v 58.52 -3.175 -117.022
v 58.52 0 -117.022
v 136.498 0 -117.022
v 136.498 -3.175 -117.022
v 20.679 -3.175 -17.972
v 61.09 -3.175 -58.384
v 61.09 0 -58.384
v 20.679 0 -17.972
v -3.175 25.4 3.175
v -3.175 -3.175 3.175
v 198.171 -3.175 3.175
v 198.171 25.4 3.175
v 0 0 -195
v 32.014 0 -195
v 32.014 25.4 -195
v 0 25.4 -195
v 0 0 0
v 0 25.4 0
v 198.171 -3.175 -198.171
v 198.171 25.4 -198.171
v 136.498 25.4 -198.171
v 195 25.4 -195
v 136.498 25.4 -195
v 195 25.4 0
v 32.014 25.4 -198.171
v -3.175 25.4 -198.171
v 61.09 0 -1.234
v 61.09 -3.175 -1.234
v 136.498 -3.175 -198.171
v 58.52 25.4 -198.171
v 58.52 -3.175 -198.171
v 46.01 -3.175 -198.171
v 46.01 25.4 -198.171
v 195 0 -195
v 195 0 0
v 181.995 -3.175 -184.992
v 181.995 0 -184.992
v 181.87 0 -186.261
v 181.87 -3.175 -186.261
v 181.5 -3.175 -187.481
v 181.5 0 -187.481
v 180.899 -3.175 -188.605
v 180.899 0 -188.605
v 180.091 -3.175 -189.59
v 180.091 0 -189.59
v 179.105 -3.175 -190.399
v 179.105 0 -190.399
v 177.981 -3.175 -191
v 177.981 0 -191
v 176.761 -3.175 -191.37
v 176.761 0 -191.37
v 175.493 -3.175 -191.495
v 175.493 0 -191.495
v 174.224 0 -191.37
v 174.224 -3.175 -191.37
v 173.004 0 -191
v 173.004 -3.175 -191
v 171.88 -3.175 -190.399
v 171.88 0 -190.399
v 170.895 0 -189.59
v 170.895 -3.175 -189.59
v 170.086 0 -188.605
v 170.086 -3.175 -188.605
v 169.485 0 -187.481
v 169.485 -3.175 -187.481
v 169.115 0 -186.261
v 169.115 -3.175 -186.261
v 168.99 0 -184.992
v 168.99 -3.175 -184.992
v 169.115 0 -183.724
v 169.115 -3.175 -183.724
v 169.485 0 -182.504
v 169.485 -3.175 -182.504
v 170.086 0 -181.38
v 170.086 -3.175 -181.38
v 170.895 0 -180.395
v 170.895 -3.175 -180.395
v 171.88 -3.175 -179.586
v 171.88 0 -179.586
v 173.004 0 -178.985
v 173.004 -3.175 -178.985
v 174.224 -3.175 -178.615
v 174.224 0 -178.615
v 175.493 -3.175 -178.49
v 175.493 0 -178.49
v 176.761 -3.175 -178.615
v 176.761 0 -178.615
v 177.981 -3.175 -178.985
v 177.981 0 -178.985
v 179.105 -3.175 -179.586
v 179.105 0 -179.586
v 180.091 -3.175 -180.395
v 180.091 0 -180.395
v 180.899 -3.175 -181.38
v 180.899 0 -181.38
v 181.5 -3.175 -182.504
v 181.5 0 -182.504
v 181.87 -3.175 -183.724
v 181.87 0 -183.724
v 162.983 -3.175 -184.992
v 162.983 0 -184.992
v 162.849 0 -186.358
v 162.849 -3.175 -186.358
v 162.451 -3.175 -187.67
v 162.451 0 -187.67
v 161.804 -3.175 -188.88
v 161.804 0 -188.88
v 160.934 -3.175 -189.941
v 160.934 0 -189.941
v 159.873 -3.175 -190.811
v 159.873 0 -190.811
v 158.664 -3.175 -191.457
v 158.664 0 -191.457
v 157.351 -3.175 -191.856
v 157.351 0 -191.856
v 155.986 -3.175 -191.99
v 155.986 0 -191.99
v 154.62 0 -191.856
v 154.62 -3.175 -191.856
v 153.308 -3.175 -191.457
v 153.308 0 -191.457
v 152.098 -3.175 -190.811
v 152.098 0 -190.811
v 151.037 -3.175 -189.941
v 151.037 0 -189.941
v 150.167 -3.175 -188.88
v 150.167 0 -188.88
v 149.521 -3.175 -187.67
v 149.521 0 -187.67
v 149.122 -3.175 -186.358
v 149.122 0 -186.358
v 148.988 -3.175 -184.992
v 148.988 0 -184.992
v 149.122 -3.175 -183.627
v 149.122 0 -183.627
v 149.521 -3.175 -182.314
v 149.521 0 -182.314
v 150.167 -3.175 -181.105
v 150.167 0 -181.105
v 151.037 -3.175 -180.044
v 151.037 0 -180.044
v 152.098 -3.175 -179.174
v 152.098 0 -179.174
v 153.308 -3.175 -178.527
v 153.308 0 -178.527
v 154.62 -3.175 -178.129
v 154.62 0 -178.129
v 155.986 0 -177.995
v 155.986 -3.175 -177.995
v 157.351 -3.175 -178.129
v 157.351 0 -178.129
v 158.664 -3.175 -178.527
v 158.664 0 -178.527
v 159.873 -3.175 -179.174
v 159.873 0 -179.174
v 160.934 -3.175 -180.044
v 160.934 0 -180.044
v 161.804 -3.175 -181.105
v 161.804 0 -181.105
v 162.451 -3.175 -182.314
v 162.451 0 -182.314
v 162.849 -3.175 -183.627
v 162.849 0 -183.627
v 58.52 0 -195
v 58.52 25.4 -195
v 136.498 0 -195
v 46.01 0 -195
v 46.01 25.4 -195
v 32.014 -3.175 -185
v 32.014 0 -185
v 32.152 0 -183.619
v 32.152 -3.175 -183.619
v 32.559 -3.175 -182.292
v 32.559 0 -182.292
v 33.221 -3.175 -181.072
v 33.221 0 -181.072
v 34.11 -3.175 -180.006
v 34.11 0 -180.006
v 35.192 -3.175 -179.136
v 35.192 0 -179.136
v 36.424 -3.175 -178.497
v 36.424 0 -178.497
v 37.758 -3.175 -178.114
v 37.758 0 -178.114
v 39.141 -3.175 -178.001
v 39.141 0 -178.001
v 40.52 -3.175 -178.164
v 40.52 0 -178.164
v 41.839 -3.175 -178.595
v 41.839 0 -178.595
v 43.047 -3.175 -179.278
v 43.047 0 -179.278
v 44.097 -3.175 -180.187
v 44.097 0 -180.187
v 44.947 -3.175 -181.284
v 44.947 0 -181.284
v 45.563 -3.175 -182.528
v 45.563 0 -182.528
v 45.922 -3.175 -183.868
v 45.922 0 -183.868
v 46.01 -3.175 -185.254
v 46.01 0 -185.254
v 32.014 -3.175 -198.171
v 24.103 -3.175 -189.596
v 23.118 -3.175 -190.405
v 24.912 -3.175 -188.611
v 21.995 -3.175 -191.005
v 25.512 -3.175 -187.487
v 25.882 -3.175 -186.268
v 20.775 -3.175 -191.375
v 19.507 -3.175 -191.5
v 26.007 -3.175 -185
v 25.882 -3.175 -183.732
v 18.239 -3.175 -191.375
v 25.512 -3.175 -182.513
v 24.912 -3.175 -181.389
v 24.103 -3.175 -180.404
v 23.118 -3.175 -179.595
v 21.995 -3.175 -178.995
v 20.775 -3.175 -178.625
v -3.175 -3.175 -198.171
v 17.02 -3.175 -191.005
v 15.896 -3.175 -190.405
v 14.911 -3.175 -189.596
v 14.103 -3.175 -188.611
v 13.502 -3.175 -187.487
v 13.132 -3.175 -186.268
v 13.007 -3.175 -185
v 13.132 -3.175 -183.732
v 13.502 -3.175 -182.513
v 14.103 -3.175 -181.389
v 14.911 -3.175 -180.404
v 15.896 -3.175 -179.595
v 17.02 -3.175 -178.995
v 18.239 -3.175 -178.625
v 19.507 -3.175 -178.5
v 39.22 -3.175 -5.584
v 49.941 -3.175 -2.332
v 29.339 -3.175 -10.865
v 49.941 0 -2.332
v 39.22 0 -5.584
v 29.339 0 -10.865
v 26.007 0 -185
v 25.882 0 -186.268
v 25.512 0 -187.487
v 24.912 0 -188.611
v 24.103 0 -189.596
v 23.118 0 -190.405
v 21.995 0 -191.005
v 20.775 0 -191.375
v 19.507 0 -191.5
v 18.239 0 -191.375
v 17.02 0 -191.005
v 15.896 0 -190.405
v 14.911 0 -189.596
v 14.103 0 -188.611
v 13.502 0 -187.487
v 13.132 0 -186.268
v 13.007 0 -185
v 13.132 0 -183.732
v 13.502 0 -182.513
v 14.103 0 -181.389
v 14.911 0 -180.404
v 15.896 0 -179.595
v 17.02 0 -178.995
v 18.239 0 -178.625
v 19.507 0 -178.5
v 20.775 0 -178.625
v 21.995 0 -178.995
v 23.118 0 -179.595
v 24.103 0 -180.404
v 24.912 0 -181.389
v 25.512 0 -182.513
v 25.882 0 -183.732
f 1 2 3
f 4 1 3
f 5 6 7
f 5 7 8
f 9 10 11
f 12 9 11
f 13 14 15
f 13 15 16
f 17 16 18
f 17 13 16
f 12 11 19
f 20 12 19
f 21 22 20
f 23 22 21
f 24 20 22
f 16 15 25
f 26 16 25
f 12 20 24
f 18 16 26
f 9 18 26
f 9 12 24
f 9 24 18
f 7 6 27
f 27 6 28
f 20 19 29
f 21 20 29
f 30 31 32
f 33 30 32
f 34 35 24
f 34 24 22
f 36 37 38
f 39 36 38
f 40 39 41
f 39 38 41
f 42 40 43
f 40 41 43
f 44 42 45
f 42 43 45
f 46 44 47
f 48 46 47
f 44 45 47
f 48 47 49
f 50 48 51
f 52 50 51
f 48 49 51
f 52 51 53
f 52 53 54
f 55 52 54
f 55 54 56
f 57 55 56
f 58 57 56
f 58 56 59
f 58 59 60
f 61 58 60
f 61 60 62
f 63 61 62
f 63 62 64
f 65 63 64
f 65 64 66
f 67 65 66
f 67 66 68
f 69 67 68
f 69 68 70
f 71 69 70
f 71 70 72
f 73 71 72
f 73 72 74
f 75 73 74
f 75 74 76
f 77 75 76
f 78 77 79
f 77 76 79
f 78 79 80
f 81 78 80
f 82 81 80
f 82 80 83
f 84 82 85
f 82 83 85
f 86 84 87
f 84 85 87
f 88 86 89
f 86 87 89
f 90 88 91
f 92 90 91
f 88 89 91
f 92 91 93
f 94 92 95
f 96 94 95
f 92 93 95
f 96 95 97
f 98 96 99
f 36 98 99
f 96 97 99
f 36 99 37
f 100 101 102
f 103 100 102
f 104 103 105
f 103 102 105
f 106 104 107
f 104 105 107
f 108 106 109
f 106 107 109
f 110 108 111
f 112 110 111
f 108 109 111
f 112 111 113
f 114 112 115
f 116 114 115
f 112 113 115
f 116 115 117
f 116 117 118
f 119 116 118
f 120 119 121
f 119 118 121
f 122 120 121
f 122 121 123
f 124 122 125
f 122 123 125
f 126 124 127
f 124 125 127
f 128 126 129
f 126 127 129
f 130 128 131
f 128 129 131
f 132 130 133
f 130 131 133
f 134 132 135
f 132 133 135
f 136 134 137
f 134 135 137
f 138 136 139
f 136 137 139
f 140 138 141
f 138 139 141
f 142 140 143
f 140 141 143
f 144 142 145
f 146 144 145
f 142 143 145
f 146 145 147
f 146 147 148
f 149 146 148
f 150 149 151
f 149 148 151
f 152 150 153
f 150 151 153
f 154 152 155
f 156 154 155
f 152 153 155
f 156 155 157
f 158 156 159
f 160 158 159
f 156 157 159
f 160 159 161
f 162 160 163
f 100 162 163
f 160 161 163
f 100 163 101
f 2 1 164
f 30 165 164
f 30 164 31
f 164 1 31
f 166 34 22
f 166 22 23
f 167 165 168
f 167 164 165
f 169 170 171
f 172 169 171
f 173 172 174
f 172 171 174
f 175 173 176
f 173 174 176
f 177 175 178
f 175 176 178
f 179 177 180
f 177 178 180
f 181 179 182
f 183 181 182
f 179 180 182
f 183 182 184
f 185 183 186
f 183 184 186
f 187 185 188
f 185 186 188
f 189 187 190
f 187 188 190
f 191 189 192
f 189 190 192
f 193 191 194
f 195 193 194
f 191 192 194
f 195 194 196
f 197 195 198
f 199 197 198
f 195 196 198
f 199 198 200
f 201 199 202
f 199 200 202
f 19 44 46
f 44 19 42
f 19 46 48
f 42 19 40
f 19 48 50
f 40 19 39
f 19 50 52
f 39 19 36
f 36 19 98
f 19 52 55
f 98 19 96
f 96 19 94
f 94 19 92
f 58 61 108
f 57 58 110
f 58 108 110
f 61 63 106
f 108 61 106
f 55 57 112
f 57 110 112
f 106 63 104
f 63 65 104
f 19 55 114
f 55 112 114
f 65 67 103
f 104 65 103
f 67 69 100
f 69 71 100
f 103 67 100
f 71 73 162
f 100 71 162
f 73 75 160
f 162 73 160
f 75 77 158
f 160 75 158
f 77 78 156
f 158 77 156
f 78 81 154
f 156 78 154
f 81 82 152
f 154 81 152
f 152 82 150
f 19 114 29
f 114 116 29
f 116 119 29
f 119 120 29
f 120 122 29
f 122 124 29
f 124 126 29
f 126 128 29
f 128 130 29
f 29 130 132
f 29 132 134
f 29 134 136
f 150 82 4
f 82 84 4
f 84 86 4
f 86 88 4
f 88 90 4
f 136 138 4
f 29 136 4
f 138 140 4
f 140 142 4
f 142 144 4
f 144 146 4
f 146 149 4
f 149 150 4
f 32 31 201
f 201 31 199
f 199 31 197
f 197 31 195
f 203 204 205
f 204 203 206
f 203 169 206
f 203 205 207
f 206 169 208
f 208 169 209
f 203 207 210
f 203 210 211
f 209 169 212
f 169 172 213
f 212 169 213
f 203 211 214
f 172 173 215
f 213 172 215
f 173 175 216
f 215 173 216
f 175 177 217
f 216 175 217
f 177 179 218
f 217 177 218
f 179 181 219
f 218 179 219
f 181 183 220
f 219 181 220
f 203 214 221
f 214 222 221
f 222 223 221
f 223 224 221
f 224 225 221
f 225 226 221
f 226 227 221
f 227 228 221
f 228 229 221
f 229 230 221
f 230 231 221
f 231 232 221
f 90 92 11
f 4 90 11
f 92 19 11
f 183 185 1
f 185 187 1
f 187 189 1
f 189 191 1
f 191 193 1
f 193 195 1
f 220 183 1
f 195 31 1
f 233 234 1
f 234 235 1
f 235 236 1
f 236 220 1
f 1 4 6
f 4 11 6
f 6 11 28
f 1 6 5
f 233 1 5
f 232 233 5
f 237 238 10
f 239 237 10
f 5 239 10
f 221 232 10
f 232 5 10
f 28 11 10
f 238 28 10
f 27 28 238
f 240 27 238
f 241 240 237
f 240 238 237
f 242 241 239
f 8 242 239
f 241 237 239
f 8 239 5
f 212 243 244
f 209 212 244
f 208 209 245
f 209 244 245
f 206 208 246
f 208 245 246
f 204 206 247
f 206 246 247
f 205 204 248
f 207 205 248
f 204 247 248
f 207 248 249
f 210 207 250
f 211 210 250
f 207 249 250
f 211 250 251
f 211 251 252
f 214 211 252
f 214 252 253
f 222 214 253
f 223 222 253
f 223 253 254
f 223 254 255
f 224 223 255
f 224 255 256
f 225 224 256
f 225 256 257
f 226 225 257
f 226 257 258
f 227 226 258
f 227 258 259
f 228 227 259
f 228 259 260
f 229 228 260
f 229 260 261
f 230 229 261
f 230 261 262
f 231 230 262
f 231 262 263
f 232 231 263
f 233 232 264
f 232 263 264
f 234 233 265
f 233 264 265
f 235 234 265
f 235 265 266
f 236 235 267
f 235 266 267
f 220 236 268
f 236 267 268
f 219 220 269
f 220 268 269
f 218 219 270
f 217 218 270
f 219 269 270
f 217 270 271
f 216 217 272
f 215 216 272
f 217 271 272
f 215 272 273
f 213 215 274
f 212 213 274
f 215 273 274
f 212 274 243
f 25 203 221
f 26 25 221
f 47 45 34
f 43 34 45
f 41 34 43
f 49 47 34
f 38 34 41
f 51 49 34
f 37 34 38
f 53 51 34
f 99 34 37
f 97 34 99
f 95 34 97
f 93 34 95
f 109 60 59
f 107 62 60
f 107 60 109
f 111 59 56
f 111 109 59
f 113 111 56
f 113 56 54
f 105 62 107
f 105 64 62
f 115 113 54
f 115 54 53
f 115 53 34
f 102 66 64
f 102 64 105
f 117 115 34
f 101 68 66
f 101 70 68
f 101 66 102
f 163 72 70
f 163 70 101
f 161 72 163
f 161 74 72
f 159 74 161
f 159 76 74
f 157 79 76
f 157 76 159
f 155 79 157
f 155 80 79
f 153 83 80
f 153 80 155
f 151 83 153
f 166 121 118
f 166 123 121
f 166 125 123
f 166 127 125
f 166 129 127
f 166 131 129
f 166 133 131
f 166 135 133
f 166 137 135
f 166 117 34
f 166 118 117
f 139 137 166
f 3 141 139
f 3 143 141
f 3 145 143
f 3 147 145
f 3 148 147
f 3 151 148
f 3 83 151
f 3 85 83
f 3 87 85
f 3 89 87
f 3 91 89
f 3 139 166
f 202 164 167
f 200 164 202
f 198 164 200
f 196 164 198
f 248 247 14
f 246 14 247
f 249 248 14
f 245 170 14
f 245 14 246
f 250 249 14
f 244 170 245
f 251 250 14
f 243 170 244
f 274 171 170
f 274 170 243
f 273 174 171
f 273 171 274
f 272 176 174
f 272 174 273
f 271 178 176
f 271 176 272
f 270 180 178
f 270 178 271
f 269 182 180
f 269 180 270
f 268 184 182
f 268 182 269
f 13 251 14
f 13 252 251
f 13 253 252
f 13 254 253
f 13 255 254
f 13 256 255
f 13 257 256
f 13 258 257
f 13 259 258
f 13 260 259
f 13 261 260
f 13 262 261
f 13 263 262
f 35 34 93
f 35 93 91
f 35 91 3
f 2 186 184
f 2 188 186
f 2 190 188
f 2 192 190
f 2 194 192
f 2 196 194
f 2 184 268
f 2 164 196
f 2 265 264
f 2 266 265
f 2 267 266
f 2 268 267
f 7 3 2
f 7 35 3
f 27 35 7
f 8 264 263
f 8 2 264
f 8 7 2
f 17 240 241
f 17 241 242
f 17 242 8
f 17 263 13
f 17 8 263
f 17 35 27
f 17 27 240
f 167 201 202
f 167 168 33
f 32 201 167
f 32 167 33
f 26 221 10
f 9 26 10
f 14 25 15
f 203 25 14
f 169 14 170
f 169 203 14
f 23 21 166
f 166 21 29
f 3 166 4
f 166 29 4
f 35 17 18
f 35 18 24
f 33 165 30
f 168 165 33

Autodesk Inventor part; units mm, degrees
ref_plane "YZ Plane" through (0, 0, 0) normal (1, 0, 0) x (0, 1, 0)
ref_plane "XZ Plane" through (0, 0, 0) normal (0, 1, 0) x (-1, 0, 0)
ref_plane "XY Plane" through (0, 0, 0) normal (0, 0, 1) x (1, 0, 0)
sketch "Sketch1" plane through (0, 0, 0) normal (0, 1, 0) x (-1, 0, 0)
  line L0 (0, 0) -> (-195, 0)
  line L1 (-195, 0) -> (-195, -195)
  line L2 (-195, -195) -> (0, -195)
  line L3 (0, -195) -> (0, 0)
  line L4 (3.175, 3.175) -> (-198.1708, 3.175)
  line L5 (-198.1708, 3.175) -> (-198.1708, -198.1708)
  line L6 (-198.1708, -198.1708) -> (3.175, -198.1708)
  line L7 (3.175, -198.1708) -> (3.175, 3.175)
  dimension "d0" = 195
  dimension "d1" = 195
  dimension "d2" = 201.3458
  dimension "d3" = 201.3458
extrude "Extrusion1" add sketch "Sketch1" along normal blind 25.4
sketch "Sketch2" plane through (0, 0, 0) normal (0, 1, 0) x (-1, 0, 0)
  line L0 (3.175, 3.175) -> (-198.1708, 3.175) projected
  line L1 (3.175, -198.1708) -> (3.175, 3.175) projected
  line L2 (-198.1708, 3.175) -> (-198.1708, -198.1708) projected
  line L3 (-198.1708, -198.1708) -> (3.175, -198.1708) projected
  point P0 (0, 0)
extrude "Extrusion2" add sketch "Sketch2" against normal blind 3.175
sketch "Sketch3" plane through (0, 0, 0) normal (0, 1, 0) x (1, 0, 0)
  line L0 (0, 195) -> (195, 195) projected
  line L1 (0, 195) -> (97.4979, 195)
  line L2 (97.4979, 195) -> (136.4979, 195)
  line L3 (97.4979, 195) -> (136.4979, 195) construction
  line L4 (136.4979, 195) -> (58.5199, 195)
  line L5 (58.5199, 195) -> (58.5199, 117.022)
  line L6 (58.5199, 117.022) -> (136.4979, 117.022)
  line L7 (136.4979, 117.022) -> (136.4979, 195)
  point P0 (0, 0)
  dimension "d8" = 97.4979
  dimension "d9" = 39
  dimension "d10" = 0
  dimension "d11" = 77.978
  dimension "d12" = 77.978
extrude "Extrusion3" cut sketch "Sketch3" against normal blind 3.175
sketch "Sketch4" plane through (0, 0, 0) normal (0, 1, 0) x (1, 0, 0)
  line L0 (0, 0) -> (0, 195) projected
  line L1 (0, 195) -> (195, 195) projected
  line L2 (58.5199, 117.022) -> (58.5199, 195) projected
  line L3 (136.4979, 195) -> (136.4979, 117.022) projected
  line L4 (195, 195) -> (195, 0) projected
  line L5 (0, 0) -> (0, 195) projected
  line L6 (0, 195) -> (19.5072, 195)
  line L7 (19.5072, 195) -> (39.0144, 195)
  line L8 (0, 195) -> (0, 185)
  circle A0 centre (19.5072, 185) radius 6.5
  circle A1 centre (39.0144, 185) radius 7
  line L9 (136.4979, 195) -> (195, 195) projected
  line L10 (195, 195) -> (195, 184.9924)
  line L11 (198.1708, 198.1708) -> (198.1708, -3.175) projected
  line L12 (195, 195) -> (205.0076, 195) construction
  line L13 (195, 195) -> (175.4928, 195)
  line L14 (195, 195) -> (214.5072, 195) construction
  line L15 (175.4928, 195) -> (155.9856, 195)
  circle A2 centre (175.4928, 184.9924) radius 6.5024
  circle A3 centre (155.9856, 184.9924) radius 6.9977
  dimension "d15" = 58.5199
  dimension "d16" = 19.5072
  dimension "d17" = 19.5072
  dimension "d18" = 10
  dimension "d19" = 13
  dimension "d20" = 14
  dimension "d21" = 10.0076
  dimension "d22" = 90
  dimension "d23" = 19.5072
  dimension "d24" = 180
  dimension "d25" = 19.5072
  dimension "d26" = 13.0048
  dimension "d27" = 13.9954
extrude "Extrusion4" cut sketch "Sketch4" against normal blind 3.175
sketch "Sketch5" plane through (0, -3.175, 0) normal (0, -1, 0) x (1, 0, 0)
  circle A0 centre (61.0901, -58.3837) radius 57.15
  line L0 (61.0901, -58.3837) -> (61.0901, -1.2337)
  line L1 (61.0901, -58.3837) -> (118.2401, -58.3837) construction
  line L2 (61.0901, -58.3837) -> (20.679, -17.9725)
  line L3 (61.0901, -58.3837) -> (118.2401, -58.3837) construction
  point P0 (0, 0)
  dimension "d32" = 114.3
  dimension "d33" = 57.15
  dimension "d34" = 90
  dimension "d35" = 57.15
  dimension "d36" = 135
extrude "Extrusion5" cut sketch "Sketch5" against normal blind 3.175 contours L0 L2 A0 picked at (52.2233, -21.4506)
sketch "Sketch6" plane through (0, -3.175, 0) normal (0, -1, 0) x (1, 0, 0)
  line L0 (136.4979, -195) -> (58.5199, -195) projected
  line L1 (-3.175, -198.1708) -> (198.1708, -198.1708) projected
  line L2 (136.4979, -195) -> (58.5199, -195)
  line L3 (58.5199, -195) -> (58.5199, -198.175)
  line L4 (58.5199, -198.175) -> (136.4979, -198.175)
  line L5 (136.4979, -198.175) -> (136.4979, -195)
  point P0 (0, 0)
  point P1 (136.4979, -198.1708)
  point P2 (58.5199, -198.1708)
  dimension "d39" = 3.175
extrude "Extrusion6" cut sketch "Sketch6" against normal through all contours L5 L1 L3 L0
sketch "Sketch7" plane through (0, -3.175, 0) normal (0, -1, 0) x (1, 0, 0)
  circle A0 centre (39.0144, -185) radius 7 projected
  line L0 (58.5199, -198.1708) -> (-3.175, -198.1708) projected
  line L1 (32.0144, -185) -> (46.0098, -185)
  line L2 (46.0098, -185) -> (46.0098, -198.1708)
  line L3 (46.0098, -198.1708) -> (32.0144, -198.1708)
  line L4 (32.0144, -198.1708) -> (32.0144, -185)
  point P0 (0, 0)
  dimension "d42" = 13.9954
extrude "Extrusion7" cut sketch "Sketch7" against normal through all contours L1 L2 A0 | A0 L2 L0 L4 picked at (36.7458, -185.5521)
properties part number "FixedLid"
